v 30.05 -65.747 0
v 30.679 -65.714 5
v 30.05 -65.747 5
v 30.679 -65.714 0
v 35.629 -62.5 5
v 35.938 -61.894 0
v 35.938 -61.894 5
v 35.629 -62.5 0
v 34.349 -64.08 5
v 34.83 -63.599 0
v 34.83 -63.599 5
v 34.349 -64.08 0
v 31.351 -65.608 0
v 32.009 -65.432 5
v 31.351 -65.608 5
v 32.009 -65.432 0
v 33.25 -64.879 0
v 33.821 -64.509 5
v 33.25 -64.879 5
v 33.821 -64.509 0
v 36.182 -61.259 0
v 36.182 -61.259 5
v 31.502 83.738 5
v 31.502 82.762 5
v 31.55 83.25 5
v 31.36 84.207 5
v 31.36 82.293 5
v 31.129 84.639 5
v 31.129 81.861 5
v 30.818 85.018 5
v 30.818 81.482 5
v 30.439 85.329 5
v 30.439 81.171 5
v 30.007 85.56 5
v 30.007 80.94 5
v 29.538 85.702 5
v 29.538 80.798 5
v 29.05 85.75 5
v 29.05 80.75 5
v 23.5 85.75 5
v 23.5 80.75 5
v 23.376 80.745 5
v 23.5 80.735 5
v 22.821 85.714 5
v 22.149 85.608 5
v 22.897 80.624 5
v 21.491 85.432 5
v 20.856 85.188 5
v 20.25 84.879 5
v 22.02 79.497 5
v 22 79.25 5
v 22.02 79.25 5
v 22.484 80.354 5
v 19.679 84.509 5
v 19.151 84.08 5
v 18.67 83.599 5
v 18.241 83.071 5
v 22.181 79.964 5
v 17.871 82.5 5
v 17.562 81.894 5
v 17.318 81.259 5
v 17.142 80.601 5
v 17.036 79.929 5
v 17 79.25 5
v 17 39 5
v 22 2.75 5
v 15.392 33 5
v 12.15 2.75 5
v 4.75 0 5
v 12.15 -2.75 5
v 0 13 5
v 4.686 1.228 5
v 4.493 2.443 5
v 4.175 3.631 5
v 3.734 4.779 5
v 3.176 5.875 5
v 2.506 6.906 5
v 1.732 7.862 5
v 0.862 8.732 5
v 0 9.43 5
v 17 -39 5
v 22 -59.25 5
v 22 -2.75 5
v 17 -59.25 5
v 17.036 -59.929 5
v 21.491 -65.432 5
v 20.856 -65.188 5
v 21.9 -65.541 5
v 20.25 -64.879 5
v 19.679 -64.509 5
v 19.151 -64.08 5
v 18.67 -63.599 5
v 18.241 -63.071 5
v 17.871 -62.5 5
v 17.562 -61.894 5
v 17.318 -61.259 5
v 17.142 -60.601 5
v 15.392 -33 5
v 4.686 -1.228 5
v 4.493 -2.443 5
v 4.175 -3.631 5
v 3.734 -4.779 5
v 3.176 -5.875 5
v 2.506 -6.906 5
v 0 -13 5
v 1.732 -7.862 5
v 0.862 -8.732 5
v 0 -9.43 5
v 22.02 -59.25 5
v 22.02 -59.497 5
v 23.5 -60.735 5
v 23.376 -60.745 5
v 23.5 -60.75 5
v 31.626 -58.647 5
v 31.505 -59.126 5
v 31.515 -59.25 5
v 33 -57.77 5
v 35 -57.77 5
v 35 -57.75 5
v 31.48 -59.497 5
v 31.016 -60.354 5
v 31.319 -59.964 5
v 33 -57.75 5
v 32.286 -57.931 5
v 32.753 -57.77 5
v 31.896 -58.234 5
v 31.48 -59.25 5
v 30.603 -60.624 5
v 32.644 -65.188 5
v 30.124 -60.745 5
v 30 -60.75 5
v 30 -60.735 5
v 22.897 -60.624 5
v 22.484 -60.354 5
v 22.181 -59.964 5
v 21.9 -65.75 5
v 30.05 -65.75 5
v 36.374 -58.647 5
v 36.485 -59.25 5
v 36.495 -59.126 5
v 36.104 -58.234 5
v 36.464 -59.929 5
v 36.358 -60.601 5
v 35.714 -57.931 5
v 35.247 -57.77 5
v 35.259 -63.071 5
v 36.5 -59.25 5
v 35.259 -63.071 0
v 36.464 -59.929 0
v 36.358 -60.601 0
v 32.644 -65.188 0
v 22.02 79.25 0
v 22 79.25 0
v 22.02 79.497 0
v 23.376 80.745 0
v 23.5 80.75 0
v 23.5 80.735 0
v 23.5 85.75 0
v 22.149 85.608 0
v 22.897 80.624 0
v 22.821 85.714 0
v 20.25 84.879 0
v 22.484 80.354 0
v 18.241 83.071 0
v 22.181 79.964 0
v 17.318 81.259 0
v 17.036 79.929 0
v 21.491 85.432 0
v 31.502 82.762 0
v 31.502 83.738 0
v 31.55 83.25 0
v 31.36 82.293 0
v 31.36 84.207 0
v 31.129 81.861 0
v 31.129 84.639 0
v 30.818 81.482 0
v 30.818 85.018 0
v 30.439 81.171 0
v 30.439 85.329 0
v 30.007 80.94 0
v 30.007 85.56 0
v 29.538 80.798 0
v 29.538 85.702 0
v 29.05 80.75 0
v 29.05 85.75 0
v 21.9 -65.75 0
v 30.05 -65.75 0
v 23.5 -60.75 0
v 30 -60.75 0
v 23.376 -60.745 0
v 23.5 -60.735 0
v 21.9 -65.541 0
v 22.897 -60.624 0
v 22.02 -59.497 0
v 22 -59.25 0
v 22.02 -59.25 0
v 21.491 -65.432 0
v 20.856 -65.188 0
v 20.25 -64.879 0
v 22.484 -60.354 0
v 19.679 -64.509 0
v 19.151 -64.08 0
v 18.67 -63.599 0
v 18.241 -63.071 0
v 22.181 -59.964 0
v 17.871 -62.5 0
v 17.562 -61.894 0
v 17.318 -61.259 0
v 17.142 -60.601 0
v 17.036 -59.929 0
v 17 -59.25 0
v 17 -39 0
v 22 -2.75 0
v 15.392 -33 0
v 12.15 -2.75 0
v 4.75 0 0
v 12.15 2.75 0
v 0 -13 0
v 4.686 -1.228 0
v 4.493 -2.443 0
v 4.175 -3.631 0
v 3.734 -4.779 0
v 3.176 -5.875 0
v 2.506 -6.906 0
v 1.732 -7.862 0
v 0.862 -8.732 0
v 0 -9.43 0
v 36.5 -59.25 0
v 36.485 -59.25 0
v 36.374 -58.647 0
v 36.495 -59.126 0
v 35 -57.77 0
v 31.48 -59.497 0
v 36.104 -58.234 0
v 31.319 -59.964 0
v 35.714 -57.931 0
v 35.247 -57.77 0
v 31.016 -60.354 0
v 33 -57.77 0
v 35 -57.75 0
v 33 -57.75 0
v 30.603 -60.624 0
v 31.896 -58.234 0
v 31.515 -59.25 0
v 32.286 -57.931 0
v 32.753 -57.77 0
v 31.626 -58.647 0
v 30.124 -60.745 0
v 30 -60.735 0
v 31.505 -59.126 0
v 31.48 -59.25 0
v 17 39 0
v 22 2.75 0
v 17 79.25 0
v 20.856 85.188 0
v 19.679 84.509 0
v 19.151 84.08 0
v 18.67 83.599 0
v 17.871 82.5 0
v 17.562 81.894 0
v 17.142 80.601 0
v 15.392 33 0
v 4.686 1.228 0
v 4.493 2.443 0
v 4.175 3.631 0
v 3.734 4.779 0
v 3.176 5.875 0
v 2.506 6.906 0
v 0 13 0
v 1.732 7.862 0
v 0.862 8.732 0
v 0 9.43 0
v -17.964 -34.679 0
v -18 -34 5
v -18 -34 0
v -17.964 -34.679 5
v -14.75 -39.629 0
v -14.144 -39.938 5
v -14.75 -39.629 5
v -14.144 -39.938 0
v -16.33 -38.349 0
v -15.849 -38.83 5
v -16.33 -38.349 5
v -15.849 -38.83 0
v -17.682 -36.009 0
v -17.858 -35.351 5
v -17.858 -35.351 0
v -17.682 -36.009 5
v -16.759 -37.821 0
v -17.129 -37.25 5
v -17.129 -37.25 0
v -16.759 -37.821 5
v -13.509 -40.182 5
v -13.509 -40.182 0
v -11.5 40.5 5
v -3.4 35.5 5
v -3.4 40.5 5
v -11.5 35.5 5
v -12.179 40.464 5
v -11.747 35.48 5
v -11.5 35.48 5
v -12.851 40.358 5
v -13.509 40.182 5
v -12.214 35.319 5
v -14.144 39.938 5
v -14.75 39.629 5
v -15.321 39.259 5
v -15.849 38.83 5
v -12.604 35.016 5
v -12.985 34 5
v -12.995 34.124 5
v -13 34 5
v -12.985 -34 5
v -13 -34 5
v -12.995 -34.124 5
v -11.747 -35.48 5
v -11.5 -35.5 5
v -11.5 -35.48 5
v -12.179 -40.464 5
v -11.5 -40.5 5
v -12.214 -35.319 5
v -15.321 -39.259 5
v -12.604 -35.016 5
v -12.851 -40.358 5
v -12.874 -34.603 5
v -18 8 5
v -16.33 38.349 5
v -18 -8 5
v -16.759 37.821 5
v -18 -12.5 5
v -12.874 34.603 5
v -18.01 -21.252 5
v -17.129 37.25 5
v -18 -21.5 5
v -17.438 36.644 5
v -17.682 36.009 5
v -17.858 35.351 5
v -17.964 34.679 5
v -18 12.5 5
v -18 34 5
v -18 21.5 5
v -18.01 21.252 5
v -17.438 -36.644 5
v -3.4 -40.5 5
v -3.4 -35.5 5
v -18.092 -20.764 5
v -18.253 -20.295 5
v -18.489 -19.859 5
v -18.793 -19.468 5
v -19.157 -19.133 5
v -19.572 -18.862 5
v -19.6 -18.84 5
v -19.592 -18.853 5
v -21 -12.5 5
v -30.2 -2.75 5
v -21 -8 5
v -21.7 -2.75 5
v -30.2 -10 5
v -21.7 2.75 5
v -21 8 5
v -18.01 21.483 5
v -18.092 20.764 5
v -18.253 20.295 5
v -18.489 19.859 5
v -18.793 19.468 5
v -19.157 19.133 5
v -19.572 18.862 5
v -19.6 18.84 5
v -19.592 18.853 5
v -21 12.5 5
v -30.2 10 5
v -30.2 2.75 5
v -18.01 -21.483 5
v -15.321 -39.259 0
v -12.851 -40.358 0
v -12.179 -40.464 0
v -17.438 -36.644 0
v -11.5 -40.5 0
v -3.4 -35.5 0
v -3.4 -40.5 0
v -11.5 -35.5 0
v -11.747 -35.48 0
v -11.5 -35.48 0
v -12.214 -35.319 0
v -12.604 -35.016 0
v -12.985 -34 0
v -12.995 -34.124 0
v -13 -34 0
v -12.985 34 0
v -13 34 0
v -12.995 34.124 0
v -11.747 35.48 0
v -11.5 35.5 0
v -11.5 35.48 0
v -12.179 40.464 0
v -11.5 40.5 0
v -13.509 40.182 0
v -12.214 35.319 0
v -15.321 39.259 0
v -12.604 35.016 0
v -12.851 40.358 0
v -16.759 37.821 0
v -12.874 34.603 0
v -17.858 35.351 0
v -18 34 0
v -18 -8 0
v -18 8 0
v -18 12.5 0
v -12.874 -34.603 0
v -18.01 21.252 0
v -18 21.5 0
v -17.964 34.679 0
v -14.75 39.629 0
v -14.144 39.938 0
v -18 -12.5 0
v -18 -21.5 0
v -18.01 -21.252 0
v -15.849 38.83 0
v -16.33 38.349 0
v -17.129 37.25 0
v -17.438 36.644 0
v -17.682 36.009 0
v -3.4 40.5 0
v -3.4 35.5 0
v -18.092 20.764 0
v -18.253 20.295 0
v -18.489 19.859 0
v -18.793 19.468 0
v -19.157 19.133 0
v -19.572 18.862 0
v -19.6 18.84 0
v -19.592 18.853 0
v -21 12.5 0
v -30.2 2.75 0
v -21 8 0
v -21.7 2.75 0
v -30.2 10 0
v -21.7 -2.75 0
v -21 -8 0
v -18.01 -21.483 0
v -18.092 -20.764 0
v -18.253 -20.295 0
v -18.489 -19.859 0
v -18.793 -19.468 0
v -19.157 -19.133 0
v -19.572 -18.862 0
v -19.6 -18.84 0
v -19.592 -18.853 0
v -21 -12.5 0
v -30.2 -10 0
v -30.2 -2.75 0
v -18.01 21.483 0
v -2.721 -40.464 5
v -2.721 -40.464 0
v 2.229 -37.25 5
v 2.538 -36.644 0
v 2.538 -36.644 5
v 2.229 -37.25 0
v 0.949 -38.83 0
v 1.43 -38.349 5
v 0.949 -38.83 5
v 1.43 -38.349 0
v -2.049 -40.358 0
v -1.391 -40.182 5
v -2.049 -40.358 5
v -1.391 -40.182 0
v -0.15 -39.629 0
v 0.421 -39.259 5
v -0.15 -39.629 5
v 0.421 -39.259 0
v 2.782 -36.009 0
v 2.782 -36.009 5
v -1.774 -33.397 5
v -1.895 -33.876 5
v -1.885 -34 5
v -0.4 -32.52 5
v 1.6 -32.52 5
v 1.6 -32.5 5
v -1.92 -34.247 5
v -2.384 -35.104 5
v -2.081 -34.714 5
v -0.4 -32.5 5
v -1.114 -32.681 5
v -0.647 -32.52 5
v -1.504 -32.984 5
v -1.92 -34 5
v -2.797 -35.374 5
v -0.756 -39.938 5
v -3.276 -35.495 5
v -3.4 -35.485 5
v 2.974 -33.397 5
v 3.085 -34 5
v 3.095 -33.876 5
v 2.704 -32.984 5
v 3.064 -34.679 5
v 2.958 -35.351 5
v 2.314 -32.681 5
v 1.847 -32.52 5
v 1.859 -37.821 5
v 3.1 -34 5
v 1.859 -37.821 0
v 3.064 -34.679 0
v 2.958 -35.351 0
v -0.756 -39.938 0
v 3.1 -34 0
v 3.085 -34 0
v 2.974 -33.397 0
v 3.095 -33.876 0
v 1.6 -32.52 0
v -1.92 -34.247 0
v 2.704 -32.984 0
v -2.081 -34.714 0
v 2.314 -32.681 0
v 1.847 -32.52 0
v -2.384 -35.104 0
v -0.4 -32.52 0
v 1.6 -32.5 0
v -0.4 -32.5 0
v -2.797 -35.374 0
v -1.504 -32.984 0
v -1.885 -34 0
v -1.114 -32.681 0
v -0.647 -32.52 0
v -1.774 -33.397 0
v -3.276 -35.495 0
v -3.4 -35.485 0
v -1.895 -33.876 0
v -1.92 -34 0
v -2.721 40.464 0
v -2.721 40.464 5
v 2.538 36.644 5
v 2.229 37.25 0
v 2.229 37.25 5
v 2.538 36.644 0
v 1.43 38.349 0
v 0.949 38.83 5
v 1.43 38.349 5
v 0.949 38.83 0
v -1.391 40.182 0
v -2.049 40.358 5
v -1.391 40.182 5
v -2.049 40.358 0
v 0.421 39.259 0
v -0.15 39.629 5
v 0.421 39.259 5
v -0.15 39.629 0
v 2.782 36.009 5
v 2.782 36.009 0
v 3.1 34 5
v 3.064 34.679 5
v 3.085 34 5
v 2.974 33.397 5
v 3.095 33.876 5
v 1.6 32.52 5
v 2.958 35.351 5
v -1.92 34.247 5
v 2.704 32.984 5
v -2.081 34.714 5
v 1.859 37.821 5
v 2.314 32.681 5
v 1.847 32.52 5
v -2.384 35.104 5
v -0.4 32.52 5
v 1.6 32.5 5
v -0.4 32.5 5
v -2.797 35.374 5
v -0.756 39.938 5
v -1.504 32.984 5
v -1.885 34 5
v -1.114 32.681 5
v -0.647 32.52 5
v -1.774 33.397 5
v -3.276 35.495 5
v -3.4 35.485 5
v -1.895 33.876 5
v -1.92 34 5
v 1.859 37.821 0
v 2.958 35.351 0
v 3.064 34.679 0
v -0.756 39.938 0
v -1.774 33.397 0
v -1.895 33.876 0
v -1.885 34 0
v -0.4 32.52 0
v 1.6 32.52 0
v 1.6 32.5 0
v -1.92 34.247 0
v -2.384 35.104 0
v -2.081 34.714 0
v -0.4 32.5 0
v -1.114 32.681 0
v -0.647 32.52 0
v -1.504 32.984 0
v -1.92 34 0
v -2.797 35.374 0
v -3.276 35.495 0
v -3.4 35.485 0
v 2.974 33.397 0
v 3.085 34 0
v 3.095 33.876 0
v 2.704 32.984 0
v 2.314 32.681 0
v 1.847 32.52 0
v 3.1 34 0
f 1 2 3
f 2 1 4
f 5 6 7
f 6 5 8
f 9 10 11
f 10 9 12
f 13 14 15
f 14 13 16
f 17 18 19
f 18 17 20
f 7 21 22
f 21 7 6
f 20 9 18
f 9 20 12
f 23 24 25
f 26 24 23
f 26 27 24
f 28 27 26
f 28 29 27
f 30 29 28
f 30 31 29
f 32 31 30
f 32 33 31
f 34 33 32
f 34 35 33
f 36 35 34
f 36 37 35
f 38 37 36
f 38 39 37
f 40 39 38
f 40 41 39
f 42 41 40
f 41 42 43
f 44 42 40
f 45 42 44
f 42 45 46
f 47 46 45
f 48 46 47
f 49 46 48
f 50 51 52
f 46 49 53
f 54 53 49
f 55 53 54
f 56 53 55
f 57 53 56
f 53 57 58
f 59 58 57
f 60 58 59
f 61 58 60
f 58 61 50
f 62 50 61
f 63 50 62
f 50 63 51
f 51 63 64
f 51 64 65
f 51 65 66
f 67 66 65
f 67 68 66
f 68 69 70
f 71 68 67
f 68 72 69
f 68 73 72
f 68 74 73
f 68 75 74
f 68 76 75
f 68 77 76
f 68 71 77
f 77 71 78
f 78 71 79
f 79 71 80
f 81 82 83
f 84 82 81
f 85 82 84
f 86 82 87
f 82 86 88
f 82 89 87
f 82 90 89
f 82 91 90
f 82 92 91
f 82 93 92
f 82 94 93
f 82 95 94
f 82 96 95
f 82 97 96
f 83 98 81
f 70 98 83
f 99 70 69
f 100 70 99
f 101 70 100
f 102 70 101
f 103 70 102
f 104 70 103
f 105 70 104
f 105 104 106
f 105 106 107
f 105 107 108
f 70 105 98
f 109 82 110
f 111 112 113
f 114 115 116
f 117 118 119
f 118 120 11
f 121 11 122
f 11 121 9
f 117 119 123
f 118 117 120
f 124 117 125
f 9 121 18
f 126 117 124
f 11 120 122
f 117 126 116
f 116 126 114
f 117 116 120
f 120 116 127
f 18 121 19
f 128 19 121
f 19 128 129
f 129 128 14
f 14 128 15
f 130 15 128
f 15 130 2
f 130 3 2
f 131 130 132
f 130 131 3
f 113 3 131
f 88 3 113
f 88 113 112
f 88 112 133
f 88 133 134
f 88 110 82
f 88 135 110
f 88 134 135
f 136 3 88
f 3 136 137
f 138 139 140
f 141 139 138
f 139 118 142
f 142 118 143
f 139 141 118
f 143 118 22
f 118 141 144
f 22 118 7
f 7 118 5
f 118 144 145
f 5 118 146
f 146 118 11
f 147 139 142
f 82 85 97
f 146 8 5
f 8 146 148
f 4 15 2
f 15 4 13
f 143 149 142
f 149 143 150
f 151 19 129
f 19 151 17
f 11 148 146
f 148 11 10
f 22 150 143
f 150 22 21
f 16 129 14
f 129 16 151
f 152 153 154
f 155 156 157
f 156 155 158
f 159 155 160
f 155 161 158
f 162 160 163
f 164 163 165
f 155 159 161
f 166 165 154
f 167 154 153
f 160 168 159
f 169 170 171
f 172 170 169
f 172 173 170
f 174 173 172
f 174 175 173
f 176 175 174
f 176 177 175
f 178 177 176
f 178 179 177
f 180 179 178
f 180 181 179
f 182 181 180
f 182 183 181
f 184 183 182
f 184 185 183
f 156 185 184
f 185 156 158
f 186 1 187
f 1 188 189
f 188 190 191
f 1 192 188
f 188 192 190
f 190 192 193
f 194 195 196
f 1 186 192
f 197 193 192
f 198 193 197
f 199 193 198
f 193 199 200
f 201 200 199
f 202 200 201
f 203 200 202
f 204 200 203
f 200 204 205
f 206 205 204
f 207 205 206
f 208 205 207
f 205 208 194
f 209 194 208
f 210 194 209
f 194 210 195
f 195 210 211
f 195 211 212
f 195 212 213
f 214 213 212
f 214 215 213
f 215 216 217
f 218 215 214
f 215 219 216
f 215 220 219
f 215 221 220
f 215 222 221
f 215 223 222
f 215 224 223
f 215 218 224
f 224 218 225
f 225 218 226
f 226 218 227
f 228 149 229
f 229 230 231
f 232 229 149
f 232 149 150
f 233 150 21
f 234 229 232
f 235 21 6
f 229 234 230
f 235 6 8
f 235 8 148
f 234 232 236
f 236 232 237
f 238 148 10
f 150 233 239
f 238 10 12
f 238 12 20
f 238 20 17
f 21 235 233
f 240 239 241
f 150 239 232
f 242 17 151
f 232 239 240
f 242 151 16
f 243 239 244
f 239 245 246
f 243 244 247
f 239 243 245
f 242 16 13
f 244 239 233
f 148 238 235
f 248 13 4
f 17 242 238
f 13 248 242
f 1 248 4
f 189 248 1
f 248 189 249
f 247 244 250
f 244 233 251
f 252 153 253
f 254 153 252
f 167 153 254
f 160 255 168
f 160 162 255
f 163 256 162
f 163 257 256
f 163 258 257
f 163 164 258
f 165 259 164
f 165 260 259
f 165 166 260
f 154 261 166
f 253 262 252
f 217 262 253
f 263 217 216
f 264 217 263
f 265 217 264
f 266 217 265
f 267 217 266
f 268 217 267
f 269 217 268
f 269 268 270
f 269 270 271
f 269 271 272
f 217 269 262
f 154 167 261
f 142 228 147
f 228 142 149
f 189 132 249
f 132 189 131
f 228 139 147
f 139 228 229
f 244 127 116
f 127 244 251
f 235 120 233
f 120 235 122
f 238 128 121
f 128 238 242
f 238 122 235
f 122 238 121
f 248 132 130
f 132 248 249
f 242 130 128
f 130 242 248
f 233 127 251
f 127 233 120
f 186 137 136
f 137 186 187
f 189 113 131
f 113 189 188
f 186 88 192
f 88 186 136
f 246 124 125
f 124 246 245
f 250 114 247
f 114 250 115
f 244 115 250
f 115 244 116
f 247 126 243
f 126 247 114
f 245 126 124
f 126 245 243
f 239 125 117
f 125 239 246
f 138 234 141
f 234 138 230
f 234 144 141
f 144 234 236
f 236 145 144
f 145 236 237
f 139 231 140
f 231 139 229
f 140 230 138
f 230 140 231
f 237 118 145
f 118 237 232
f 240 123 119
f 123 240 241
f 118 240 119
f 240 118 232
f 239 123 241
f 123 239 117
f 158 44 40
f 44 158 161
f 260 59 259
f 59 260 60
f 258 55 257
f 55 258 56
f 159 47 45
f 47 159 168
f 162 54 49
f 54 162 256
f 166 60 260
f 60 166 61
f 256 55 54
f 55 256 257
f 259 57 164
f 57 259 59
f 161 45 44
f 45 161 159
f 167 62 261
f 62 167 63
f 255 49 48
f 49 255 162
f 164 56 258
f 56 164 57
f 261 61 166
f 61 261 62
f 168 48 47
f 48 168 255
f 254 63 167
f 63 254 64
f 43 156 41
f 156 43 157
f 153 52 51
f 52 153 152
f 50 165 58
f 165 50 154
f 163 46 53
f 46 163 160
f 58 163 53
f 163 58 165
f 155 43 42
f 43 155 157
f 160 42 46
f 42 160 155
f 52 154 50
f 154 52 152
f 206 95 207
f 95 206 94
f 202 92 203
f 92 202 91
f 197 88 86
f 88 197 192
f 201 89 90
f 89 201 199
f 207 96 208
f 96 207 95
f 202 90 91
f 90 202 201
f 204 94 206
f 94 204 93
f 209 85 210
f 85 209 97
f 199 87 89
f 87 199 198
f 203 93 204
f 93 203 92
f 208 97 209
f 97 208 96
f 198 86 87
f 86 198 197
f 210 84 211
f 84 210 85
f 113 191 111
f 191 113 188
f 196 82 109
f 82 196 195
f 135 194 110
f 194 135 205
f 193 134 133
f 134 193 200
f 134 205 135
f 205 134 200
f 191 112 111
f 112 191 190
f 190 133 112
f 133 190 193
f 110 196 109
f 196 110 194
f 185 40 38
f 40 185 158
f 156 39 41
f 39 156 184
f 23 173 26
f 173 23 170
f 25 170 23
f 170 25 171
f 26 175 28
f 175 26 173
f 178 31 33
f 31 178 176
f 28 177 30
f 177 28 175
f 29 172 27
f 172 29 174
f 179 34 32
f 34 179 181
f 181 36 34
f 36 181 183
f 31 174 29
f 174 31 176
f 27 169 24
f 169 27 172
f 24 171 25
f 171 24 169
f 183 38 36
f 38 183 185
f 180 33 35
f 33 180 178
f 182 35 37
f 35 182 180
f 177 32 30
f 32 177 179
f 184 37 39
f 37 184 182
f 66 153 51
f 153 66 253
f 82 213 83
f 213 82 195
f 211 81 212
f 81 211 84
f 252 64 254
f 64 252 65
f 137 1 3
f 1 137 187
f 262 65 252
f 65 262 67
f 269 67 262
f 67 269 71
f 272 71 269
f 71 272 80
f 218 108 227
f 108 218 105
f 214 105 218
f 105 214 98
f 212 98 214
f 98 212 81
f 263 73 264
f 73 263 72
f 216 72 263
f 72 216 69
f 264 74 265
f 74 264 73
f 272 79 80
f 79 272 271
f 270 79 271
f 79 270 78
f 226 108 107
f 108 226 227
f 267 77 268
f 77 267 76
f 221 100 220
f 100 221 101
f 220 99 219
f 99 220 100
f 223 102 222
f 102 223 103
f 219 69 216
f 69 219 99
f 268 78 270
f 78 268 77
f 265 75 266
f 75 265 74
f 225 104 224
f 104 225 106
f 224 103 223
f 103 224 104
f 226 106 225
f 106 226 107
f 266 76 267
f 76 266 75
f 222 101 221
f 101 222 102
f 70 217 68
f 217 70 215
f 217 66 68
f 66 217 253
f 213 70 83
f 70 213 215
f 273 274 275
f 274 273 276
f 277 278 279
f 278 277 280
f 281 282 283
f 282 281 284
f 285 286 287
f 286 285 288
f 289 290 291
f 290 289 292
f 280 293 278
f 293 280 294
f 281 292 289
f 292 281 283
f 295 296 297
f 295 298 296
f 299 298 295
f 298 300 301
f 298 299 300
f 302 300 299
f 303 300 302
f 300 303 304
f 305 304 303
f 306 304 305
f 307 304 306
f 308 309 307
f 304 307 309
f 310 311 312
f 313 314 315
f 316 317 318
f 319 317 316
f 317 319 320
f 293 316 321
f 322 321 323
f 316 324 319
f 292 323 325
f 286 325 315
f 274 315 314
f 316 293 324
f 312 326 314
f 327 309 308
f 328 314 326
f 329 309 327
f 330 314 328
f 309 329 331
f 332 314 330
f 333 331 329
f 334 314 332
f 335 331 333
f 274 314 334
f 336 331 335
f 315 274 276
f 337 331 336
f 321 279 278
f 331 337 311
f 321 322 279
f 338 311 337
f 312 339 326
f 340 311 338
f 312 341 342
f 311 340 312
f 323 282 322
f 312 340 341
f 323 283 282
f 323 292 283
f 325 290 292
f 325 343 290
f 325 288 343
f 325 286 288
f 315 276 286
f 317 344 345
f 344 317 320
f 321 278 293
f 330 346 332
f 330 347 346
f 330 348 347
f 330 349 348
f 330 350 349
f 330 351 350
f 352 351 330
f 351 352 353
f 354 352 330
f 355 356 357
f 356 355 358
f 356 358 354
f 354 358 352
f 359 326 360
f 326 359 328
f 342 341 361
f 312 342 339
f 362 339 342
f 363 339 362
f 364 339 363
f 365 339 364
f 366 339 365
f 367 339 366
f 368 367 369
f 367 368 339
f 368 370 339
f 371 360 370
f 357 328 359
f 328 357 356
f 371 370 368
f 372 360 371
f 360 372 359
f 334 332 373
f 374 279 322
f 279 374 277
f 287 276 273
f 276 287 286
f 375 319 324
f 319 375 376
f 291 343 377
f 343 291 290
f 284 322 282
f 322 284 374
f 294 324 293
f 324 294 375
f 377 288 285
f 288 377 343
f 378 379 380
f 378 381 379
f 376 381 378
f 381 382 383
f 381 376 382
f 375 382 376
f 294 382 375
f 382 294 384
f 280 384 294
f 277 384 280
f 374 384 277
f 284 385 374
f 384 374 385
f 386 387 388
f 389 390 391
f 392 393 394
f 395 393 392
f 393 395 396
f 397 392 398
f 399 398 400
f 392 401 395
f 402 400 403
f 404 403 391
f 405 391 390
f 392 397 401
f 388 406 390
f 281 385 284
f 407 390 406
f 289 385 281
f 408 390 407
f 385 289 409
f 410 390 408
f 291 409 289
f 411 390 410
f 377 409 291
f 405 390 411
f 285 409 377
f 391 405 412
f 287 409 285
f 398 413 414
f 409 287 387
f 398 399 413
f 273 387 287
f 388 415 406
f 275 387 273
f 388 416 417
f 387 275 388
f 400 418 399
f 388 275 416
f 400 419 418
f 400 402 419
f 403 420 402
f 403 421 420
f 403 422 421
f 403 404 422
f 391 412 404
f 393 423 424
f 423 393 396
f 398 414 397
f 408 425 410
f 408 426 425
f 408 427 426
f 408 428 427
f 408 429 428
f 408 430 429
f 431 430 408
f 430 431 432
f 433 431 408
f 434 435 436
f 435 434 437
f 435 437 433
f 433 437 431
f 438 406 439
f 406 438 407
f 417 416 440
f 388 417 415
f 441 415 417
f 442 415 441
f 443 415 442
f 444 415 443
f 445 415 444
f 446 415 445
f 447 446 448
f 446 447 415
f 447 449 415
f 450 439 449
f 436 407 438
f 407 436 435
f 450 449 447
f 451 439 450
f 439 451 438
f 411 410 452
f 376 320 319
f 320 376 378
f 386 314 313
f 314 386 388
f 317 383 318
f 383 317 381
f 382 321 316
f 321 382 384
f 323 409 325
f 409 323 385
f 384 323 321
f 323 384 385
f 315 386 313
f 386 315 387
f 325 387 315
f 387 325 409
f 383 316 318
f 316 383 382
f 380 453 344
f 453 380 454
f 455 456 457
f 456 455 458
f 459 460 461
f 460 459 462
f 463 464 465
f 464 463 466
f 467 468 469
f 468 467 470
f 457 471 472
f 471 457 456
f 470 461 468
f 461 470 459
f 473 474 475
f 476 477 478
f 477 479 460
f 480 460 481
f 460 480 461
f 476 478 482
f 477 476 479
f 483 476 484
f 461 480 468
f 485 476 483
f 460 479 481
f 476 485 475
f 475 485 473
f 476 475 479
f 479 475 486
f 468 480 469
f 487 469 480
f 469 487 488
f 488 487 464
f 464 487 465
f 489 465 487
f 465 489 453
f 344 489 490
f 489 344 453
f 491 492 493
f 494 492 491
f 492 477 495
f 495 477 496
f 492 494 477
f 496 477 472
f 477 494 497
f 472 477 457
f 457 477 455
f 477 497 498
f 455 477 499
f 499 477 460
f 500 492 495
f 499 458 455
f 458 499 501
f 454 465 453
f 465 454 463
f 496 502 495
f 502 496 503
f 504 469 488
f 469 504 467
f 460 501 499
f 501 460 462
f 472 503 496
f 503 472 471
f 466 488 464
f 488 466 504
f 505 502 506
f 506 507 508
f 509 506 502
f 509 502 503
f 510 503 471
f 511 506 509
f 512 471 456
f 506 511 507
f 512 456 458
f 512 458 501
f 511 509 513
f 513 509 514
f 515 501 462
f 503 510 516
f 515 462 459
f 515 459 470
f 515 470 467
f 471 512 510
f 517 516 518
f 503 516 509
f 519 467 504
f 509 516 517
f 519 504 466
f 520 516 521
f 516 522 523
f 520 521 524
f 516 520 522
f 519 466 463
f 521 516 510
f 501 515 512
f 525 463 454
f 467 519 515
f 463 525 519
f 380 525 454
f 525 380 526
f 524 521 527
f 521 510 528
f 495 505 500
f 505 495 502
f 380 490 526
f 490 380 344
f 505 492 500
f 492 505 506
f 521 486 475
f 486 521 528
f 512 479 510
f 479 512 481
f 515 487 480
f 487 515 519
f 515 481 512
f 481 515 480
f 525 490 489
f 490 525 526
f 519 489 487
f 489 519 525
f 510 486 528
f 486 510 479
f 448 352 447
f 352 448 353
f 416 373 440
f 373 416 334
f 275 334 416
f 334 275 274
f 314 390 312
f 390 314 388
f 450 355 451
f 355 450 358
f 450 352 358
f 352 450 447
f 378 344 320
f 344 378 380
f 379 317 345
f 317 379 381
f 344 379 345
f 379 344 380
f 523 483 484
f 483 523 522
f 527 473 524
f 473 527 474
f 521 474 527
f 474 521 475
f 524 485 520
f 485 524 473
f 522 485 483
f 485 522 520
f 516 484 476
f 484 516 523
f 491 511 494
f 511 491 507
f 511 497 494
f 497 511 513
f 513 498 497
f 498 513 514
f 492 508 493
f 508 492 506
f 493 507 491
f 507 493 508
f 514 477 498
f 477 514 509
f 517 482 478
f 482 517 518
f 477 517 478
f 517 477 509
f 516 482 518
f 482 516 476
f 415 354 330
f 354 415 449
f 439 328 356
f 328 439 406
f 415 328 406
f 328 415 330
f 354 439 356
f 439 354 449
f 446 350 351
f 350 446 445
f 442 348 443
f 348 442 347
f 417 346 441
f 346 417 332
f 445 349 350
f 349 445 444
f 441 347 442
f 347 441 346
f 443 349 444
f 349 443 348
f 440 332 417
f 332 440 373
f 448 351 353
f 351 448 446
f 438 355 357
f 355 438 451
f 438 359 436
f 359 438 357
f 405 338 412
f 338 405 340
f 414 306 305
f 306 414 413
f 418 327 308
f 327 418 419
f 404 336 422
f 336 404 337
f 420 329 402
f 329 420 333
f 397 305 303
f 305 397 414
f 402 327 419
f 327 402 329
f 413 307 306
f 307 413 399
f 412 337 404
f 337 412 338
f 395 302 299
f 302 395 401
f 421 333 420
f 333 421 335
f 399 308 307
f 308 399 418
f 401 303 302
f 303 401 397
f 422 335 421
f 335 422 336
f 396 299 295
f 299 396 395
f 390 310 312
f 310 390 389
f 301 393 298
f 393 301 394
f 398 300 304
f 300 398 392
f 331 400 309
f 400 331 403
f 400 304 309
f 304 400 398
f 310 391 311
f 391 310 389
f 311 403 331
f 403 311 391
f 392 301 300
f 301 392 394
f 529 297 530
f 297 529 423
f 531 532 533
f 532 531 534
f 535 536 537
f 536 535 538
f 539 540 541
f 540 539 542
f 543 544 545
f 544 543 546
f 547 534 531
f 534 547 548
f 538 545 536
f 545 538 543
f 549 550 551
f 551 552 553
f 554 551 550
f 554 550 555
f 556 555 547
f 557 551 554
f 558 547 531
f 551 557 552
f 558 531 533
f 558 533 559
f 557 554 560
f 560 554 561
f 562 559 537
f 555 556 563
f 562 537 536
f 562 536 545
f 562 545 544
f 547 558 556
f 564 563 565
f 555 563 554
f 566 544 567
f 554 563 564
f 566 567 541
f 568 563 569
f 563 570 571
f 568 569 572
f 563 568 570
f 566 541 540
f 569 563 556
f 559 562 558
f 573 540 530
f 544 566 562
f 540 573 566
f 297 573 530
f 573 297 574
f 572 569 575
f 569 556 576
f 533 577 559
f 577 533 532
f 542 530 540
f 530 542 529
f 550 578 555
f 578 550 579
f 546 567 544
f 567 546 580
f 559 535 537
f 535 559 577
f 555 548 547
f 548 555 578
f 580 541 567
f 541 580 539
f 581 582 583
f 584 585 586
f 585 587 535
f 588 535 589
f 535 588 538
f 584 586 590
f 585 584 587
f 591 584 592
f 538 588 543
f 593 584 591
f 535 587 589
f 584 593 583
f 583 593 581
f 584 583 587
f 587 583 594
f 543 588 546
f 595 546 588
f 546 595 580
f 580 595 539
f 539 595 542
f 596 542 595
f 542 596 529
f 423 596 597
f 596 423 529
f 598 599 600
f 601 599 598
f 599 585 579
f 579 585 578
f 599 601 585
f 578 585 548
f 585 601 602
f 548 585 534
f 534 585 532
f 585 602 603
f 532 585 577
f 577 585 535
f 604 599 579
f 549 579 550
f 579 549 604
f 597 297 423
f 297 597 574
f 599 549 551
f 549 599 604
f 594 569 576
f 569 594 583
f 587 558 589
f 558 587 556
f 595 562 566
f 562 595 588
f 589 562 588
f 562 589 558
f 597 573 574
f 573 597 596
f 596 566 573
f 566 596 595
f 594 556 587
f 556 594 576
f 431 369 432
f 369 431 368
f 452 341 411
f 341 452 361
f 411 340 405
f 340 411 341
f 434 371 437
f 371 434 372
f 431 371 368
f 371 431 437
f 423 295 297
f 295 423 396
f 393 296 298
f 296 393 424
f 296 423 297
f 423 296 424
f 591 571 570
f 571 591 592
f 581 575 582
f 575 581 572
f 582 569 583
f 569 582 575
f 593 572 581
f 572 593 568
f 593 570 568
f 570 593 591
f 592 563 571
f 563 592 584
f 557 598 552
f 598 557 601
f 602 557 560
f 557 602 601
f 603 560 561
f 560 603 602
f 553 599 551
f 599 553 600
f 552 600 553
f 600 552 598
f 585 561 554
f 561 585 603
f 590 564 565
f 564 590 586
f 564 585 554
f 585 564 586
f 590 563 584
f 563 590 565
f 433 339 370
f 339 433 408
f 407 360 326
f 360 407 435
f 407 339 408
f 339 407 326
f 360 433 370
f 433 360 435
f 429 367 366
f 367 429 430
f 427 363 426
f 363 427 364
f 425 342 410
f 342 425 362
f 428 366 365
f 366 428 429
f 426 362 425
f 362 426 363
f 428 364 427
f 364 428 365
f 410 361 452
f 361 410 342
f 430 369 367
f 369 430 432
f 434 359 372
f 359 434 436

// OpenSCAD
// Depending on your printer, you should add an extra 1 to 2 mm.
Phone_Length=140.5+1;
// Depending on your printer, you should add an extra 1 to 2 mm.
Phone_Width=70+1;
// Depending on your printer, you should add an extra 1 to 2 mm.
Phone_Thickness = 10.1+1;
// Offset the phone vertically. This is useful if your phone have side buttons at the middle that is blocked by the side grip. A positive value will shift the phone upwards, while a negative value shifts it downwards.
Vertical_Offset = 10;//Phone_Length/2-65;
// Allow you to attach two vertical pieces instead of one. This can be useful if you want to charge your phone while it's in the holder.
Dual_Vertical = 0; // [8:True, 0:False]
// Trade off between improved grip and ease of insertion/removal. Increasing this number will increase height of the top catch, improving grip but making it harder to remove the phone. The default should be fine for most cases.
Grip = 0;

// Diameter of the bar where the holder is to be mounted.
//Handle_Bar_Diameter = 27.66+1;
Handle_Bar_Diameter = 22.5+1; //my bike
// Distance from the handle bar to the back of the phone. A smaller number will give a lower profile.
Holder_Height = 17; // [11:20]

Handle_Bar_Lengh = 26;

zip_tie_width = 4.5;
/* [Hidden] */
$fs = 0.5;
$fa = 6;

module copy_mirror(vec=[0,1,0]) {
 union() {
  children();
  mirror(vec) children();
 }
};

module rounded_corner(vec=[0,0,0],rot=0) {
 translate(vec) rotate([0,0,rot]) difference(){
  intersection(){
   cylinder(r=6.5,h=5);
   translate([-6.5,0,0]) cube([6.5,6.5,5]);
  };
  cylinder(r=1.5,h=5);
 };
};



translate([3.4,Vertical_Offset,0])
rotate([0,0,-90])
union() {
  //rounded_corner([Phone_Width/2-1.5,18.5,0],180);
  translate([Phone_Length/2,18.5,0]) cube([5,Phone_Thickness-3,5]);
  rounded_corner([Phone_Length/2-1.5,17+Phone_Thickness-1.5,0],-90);
  translate([Phone_Length/2-1.5,17+Phone_Thickness+1.5,0]) cylinder(r=1.5,h=5);
  translate([Phone_Length/2-1.5,17+Phone_Thickness+5-1.5,0]) cylinder(r=1.5,h=5);
  translate([Phone_Length/2-3,17+Phone_Thickness+1.5,0]) cube([1.5,2,5]);
};


Height_Extension = 5;
arc_offset = -7;
// Vertical Piece
//translate([2.5,0,0]) rotate([0,-90,0]) difference(){
difference(){
 union() {
  translate ([0,Vertical_Offset,0]) union(){
   translate([18.5+Height_Extension,Phone_Length/2,0]) cube([Phone_Thickness/2+Grip,5,5]);
   translate([18.5+Height_Extension+Phone_Thickness/2+Grip,Phone_Length/2+2.5,0]) cylinder(r=2.5,h=5);
   copy_mirror([0,1,0]) rounded_corner([18.5+Height_Extension,Phone_Length/2-1.5,0]);
  

      
   translate([12+Height_Extension,-Phone_Length/2+1.5,0]) cube([5,Phone_Length-3,5]);
   translate([18.5+Height_Extension,-Phone_Length/2-5,0]) cube([Phone_Thickness/2+1,5,5]);
   //translate([19.5+Height_Extension+Phone_Thickness/2,-Phone_Length/2-2.5,0]) cylinder(r=2.5,h=5);
//   translate([18.5,-Phone_Length/2-5,0]) cube([Phone_Thickness-1.5,5,5]);
//   translate([17+Phone_Thickness,-Phone_Length/2-2.5,0]) cylinder(r=2.5,h=5);
  };
  linear_extrude(height=5) polygon([[12+5,-39],[12+5,39],[10+5.3923,33],[0,Handle_Bar_Lengh/2],[0,-Handle_Bar_Lengh/2],[10+5.3923,-33]]);
 };
 copy_mirror([0,1,0]) translate([0,39,0]) cylinder(r=12,h=5);
  translate([arc_offset,0,-5]) cylinder(r=Handle_Bar_Diameter/2,h=20);
 
 translate([-Holder_Height/4-0.1-1+17.5,-5.5/2,-10]) cube([Holder_Height/2+0.2+2,5.5,20]);
 //translate([-Holder_Height,-30,0]) cube([17,60,5]);
};


//comment the rest out if you want to print part by part

offset = 2.8;
// Horizontal Piece
//translate([0,2.5,0]) rotate([90,0,0]) copy_mirror([1,0,0]) difference(){
translate([-30,0,0]) rotate([0,0,-90]) copy_mirror([1,0,0]) difference(){
 union(){
//  linear_extrude(height=5) polygon([[0,-3],[10,-3],[14.6768,10.0145],[17.5,12],[Phone_Width/2-1.5,12],[Phone_Width/2-1.5,17],[0,17]]);
  linear_extrude(height=5) polygon([[0,-3+offset],[10,-3+offset],[18.84,10.4],[21.5,12],[Phone_Width/2-1.5,12],[Phone_Width/2-1.5,17],[0,17]]);
  rounded_corner([Phone_Width/2-1.5,18.5,0],180);
  translate([Phone_Width/2,18.5,0]) cube([5,Phone_Thickness-3,5]);
  rounded_corner([Phone_Width/2-1.5,17+Phone_Thickness-1.5,0],-90);
  translate([Phone_Width/2-1.5,17+Phone_Thickness+1.5,0]) cylinder(r=1.5,h=5);
  translate([Phone_Width/2-1.5,17+Phone_Thickness+5-1.5,0]) cylinder(r=1.5,h=5);
  translate([Phone_Width/2-3,17+Phone_Thickness+1.5,0]) cube([1.5,2,5]);
//  translate([5.5/2,17,5/2]) rotate([90,0,0]) linear_extrude(height=20) polygon([[0,0],[5,0],[0,5]]);
 };
 translate([21.5,9,0]) cylinder(r=3,h=5);
 //translate([0,-Handle_Bar_Diameter/2-Holder_Height+17,0]) cylinder(r=Handle_Bar_Diameter/2,h=10);
 translate([-5.5/2,5.5+offset-(Holder_Height/2+0.2),0]) cube([5.5,Holder_Height/2+0.2,5]); // The poorly named Dual_Vertical contains the horizontal offset for the slot.
 copy_mirror([0,1,0]) translate([8,Handle_Bar_Lengh/2-4,0]) cube([zip_tie_width,zip_tie_width-1.5,5]);
};
